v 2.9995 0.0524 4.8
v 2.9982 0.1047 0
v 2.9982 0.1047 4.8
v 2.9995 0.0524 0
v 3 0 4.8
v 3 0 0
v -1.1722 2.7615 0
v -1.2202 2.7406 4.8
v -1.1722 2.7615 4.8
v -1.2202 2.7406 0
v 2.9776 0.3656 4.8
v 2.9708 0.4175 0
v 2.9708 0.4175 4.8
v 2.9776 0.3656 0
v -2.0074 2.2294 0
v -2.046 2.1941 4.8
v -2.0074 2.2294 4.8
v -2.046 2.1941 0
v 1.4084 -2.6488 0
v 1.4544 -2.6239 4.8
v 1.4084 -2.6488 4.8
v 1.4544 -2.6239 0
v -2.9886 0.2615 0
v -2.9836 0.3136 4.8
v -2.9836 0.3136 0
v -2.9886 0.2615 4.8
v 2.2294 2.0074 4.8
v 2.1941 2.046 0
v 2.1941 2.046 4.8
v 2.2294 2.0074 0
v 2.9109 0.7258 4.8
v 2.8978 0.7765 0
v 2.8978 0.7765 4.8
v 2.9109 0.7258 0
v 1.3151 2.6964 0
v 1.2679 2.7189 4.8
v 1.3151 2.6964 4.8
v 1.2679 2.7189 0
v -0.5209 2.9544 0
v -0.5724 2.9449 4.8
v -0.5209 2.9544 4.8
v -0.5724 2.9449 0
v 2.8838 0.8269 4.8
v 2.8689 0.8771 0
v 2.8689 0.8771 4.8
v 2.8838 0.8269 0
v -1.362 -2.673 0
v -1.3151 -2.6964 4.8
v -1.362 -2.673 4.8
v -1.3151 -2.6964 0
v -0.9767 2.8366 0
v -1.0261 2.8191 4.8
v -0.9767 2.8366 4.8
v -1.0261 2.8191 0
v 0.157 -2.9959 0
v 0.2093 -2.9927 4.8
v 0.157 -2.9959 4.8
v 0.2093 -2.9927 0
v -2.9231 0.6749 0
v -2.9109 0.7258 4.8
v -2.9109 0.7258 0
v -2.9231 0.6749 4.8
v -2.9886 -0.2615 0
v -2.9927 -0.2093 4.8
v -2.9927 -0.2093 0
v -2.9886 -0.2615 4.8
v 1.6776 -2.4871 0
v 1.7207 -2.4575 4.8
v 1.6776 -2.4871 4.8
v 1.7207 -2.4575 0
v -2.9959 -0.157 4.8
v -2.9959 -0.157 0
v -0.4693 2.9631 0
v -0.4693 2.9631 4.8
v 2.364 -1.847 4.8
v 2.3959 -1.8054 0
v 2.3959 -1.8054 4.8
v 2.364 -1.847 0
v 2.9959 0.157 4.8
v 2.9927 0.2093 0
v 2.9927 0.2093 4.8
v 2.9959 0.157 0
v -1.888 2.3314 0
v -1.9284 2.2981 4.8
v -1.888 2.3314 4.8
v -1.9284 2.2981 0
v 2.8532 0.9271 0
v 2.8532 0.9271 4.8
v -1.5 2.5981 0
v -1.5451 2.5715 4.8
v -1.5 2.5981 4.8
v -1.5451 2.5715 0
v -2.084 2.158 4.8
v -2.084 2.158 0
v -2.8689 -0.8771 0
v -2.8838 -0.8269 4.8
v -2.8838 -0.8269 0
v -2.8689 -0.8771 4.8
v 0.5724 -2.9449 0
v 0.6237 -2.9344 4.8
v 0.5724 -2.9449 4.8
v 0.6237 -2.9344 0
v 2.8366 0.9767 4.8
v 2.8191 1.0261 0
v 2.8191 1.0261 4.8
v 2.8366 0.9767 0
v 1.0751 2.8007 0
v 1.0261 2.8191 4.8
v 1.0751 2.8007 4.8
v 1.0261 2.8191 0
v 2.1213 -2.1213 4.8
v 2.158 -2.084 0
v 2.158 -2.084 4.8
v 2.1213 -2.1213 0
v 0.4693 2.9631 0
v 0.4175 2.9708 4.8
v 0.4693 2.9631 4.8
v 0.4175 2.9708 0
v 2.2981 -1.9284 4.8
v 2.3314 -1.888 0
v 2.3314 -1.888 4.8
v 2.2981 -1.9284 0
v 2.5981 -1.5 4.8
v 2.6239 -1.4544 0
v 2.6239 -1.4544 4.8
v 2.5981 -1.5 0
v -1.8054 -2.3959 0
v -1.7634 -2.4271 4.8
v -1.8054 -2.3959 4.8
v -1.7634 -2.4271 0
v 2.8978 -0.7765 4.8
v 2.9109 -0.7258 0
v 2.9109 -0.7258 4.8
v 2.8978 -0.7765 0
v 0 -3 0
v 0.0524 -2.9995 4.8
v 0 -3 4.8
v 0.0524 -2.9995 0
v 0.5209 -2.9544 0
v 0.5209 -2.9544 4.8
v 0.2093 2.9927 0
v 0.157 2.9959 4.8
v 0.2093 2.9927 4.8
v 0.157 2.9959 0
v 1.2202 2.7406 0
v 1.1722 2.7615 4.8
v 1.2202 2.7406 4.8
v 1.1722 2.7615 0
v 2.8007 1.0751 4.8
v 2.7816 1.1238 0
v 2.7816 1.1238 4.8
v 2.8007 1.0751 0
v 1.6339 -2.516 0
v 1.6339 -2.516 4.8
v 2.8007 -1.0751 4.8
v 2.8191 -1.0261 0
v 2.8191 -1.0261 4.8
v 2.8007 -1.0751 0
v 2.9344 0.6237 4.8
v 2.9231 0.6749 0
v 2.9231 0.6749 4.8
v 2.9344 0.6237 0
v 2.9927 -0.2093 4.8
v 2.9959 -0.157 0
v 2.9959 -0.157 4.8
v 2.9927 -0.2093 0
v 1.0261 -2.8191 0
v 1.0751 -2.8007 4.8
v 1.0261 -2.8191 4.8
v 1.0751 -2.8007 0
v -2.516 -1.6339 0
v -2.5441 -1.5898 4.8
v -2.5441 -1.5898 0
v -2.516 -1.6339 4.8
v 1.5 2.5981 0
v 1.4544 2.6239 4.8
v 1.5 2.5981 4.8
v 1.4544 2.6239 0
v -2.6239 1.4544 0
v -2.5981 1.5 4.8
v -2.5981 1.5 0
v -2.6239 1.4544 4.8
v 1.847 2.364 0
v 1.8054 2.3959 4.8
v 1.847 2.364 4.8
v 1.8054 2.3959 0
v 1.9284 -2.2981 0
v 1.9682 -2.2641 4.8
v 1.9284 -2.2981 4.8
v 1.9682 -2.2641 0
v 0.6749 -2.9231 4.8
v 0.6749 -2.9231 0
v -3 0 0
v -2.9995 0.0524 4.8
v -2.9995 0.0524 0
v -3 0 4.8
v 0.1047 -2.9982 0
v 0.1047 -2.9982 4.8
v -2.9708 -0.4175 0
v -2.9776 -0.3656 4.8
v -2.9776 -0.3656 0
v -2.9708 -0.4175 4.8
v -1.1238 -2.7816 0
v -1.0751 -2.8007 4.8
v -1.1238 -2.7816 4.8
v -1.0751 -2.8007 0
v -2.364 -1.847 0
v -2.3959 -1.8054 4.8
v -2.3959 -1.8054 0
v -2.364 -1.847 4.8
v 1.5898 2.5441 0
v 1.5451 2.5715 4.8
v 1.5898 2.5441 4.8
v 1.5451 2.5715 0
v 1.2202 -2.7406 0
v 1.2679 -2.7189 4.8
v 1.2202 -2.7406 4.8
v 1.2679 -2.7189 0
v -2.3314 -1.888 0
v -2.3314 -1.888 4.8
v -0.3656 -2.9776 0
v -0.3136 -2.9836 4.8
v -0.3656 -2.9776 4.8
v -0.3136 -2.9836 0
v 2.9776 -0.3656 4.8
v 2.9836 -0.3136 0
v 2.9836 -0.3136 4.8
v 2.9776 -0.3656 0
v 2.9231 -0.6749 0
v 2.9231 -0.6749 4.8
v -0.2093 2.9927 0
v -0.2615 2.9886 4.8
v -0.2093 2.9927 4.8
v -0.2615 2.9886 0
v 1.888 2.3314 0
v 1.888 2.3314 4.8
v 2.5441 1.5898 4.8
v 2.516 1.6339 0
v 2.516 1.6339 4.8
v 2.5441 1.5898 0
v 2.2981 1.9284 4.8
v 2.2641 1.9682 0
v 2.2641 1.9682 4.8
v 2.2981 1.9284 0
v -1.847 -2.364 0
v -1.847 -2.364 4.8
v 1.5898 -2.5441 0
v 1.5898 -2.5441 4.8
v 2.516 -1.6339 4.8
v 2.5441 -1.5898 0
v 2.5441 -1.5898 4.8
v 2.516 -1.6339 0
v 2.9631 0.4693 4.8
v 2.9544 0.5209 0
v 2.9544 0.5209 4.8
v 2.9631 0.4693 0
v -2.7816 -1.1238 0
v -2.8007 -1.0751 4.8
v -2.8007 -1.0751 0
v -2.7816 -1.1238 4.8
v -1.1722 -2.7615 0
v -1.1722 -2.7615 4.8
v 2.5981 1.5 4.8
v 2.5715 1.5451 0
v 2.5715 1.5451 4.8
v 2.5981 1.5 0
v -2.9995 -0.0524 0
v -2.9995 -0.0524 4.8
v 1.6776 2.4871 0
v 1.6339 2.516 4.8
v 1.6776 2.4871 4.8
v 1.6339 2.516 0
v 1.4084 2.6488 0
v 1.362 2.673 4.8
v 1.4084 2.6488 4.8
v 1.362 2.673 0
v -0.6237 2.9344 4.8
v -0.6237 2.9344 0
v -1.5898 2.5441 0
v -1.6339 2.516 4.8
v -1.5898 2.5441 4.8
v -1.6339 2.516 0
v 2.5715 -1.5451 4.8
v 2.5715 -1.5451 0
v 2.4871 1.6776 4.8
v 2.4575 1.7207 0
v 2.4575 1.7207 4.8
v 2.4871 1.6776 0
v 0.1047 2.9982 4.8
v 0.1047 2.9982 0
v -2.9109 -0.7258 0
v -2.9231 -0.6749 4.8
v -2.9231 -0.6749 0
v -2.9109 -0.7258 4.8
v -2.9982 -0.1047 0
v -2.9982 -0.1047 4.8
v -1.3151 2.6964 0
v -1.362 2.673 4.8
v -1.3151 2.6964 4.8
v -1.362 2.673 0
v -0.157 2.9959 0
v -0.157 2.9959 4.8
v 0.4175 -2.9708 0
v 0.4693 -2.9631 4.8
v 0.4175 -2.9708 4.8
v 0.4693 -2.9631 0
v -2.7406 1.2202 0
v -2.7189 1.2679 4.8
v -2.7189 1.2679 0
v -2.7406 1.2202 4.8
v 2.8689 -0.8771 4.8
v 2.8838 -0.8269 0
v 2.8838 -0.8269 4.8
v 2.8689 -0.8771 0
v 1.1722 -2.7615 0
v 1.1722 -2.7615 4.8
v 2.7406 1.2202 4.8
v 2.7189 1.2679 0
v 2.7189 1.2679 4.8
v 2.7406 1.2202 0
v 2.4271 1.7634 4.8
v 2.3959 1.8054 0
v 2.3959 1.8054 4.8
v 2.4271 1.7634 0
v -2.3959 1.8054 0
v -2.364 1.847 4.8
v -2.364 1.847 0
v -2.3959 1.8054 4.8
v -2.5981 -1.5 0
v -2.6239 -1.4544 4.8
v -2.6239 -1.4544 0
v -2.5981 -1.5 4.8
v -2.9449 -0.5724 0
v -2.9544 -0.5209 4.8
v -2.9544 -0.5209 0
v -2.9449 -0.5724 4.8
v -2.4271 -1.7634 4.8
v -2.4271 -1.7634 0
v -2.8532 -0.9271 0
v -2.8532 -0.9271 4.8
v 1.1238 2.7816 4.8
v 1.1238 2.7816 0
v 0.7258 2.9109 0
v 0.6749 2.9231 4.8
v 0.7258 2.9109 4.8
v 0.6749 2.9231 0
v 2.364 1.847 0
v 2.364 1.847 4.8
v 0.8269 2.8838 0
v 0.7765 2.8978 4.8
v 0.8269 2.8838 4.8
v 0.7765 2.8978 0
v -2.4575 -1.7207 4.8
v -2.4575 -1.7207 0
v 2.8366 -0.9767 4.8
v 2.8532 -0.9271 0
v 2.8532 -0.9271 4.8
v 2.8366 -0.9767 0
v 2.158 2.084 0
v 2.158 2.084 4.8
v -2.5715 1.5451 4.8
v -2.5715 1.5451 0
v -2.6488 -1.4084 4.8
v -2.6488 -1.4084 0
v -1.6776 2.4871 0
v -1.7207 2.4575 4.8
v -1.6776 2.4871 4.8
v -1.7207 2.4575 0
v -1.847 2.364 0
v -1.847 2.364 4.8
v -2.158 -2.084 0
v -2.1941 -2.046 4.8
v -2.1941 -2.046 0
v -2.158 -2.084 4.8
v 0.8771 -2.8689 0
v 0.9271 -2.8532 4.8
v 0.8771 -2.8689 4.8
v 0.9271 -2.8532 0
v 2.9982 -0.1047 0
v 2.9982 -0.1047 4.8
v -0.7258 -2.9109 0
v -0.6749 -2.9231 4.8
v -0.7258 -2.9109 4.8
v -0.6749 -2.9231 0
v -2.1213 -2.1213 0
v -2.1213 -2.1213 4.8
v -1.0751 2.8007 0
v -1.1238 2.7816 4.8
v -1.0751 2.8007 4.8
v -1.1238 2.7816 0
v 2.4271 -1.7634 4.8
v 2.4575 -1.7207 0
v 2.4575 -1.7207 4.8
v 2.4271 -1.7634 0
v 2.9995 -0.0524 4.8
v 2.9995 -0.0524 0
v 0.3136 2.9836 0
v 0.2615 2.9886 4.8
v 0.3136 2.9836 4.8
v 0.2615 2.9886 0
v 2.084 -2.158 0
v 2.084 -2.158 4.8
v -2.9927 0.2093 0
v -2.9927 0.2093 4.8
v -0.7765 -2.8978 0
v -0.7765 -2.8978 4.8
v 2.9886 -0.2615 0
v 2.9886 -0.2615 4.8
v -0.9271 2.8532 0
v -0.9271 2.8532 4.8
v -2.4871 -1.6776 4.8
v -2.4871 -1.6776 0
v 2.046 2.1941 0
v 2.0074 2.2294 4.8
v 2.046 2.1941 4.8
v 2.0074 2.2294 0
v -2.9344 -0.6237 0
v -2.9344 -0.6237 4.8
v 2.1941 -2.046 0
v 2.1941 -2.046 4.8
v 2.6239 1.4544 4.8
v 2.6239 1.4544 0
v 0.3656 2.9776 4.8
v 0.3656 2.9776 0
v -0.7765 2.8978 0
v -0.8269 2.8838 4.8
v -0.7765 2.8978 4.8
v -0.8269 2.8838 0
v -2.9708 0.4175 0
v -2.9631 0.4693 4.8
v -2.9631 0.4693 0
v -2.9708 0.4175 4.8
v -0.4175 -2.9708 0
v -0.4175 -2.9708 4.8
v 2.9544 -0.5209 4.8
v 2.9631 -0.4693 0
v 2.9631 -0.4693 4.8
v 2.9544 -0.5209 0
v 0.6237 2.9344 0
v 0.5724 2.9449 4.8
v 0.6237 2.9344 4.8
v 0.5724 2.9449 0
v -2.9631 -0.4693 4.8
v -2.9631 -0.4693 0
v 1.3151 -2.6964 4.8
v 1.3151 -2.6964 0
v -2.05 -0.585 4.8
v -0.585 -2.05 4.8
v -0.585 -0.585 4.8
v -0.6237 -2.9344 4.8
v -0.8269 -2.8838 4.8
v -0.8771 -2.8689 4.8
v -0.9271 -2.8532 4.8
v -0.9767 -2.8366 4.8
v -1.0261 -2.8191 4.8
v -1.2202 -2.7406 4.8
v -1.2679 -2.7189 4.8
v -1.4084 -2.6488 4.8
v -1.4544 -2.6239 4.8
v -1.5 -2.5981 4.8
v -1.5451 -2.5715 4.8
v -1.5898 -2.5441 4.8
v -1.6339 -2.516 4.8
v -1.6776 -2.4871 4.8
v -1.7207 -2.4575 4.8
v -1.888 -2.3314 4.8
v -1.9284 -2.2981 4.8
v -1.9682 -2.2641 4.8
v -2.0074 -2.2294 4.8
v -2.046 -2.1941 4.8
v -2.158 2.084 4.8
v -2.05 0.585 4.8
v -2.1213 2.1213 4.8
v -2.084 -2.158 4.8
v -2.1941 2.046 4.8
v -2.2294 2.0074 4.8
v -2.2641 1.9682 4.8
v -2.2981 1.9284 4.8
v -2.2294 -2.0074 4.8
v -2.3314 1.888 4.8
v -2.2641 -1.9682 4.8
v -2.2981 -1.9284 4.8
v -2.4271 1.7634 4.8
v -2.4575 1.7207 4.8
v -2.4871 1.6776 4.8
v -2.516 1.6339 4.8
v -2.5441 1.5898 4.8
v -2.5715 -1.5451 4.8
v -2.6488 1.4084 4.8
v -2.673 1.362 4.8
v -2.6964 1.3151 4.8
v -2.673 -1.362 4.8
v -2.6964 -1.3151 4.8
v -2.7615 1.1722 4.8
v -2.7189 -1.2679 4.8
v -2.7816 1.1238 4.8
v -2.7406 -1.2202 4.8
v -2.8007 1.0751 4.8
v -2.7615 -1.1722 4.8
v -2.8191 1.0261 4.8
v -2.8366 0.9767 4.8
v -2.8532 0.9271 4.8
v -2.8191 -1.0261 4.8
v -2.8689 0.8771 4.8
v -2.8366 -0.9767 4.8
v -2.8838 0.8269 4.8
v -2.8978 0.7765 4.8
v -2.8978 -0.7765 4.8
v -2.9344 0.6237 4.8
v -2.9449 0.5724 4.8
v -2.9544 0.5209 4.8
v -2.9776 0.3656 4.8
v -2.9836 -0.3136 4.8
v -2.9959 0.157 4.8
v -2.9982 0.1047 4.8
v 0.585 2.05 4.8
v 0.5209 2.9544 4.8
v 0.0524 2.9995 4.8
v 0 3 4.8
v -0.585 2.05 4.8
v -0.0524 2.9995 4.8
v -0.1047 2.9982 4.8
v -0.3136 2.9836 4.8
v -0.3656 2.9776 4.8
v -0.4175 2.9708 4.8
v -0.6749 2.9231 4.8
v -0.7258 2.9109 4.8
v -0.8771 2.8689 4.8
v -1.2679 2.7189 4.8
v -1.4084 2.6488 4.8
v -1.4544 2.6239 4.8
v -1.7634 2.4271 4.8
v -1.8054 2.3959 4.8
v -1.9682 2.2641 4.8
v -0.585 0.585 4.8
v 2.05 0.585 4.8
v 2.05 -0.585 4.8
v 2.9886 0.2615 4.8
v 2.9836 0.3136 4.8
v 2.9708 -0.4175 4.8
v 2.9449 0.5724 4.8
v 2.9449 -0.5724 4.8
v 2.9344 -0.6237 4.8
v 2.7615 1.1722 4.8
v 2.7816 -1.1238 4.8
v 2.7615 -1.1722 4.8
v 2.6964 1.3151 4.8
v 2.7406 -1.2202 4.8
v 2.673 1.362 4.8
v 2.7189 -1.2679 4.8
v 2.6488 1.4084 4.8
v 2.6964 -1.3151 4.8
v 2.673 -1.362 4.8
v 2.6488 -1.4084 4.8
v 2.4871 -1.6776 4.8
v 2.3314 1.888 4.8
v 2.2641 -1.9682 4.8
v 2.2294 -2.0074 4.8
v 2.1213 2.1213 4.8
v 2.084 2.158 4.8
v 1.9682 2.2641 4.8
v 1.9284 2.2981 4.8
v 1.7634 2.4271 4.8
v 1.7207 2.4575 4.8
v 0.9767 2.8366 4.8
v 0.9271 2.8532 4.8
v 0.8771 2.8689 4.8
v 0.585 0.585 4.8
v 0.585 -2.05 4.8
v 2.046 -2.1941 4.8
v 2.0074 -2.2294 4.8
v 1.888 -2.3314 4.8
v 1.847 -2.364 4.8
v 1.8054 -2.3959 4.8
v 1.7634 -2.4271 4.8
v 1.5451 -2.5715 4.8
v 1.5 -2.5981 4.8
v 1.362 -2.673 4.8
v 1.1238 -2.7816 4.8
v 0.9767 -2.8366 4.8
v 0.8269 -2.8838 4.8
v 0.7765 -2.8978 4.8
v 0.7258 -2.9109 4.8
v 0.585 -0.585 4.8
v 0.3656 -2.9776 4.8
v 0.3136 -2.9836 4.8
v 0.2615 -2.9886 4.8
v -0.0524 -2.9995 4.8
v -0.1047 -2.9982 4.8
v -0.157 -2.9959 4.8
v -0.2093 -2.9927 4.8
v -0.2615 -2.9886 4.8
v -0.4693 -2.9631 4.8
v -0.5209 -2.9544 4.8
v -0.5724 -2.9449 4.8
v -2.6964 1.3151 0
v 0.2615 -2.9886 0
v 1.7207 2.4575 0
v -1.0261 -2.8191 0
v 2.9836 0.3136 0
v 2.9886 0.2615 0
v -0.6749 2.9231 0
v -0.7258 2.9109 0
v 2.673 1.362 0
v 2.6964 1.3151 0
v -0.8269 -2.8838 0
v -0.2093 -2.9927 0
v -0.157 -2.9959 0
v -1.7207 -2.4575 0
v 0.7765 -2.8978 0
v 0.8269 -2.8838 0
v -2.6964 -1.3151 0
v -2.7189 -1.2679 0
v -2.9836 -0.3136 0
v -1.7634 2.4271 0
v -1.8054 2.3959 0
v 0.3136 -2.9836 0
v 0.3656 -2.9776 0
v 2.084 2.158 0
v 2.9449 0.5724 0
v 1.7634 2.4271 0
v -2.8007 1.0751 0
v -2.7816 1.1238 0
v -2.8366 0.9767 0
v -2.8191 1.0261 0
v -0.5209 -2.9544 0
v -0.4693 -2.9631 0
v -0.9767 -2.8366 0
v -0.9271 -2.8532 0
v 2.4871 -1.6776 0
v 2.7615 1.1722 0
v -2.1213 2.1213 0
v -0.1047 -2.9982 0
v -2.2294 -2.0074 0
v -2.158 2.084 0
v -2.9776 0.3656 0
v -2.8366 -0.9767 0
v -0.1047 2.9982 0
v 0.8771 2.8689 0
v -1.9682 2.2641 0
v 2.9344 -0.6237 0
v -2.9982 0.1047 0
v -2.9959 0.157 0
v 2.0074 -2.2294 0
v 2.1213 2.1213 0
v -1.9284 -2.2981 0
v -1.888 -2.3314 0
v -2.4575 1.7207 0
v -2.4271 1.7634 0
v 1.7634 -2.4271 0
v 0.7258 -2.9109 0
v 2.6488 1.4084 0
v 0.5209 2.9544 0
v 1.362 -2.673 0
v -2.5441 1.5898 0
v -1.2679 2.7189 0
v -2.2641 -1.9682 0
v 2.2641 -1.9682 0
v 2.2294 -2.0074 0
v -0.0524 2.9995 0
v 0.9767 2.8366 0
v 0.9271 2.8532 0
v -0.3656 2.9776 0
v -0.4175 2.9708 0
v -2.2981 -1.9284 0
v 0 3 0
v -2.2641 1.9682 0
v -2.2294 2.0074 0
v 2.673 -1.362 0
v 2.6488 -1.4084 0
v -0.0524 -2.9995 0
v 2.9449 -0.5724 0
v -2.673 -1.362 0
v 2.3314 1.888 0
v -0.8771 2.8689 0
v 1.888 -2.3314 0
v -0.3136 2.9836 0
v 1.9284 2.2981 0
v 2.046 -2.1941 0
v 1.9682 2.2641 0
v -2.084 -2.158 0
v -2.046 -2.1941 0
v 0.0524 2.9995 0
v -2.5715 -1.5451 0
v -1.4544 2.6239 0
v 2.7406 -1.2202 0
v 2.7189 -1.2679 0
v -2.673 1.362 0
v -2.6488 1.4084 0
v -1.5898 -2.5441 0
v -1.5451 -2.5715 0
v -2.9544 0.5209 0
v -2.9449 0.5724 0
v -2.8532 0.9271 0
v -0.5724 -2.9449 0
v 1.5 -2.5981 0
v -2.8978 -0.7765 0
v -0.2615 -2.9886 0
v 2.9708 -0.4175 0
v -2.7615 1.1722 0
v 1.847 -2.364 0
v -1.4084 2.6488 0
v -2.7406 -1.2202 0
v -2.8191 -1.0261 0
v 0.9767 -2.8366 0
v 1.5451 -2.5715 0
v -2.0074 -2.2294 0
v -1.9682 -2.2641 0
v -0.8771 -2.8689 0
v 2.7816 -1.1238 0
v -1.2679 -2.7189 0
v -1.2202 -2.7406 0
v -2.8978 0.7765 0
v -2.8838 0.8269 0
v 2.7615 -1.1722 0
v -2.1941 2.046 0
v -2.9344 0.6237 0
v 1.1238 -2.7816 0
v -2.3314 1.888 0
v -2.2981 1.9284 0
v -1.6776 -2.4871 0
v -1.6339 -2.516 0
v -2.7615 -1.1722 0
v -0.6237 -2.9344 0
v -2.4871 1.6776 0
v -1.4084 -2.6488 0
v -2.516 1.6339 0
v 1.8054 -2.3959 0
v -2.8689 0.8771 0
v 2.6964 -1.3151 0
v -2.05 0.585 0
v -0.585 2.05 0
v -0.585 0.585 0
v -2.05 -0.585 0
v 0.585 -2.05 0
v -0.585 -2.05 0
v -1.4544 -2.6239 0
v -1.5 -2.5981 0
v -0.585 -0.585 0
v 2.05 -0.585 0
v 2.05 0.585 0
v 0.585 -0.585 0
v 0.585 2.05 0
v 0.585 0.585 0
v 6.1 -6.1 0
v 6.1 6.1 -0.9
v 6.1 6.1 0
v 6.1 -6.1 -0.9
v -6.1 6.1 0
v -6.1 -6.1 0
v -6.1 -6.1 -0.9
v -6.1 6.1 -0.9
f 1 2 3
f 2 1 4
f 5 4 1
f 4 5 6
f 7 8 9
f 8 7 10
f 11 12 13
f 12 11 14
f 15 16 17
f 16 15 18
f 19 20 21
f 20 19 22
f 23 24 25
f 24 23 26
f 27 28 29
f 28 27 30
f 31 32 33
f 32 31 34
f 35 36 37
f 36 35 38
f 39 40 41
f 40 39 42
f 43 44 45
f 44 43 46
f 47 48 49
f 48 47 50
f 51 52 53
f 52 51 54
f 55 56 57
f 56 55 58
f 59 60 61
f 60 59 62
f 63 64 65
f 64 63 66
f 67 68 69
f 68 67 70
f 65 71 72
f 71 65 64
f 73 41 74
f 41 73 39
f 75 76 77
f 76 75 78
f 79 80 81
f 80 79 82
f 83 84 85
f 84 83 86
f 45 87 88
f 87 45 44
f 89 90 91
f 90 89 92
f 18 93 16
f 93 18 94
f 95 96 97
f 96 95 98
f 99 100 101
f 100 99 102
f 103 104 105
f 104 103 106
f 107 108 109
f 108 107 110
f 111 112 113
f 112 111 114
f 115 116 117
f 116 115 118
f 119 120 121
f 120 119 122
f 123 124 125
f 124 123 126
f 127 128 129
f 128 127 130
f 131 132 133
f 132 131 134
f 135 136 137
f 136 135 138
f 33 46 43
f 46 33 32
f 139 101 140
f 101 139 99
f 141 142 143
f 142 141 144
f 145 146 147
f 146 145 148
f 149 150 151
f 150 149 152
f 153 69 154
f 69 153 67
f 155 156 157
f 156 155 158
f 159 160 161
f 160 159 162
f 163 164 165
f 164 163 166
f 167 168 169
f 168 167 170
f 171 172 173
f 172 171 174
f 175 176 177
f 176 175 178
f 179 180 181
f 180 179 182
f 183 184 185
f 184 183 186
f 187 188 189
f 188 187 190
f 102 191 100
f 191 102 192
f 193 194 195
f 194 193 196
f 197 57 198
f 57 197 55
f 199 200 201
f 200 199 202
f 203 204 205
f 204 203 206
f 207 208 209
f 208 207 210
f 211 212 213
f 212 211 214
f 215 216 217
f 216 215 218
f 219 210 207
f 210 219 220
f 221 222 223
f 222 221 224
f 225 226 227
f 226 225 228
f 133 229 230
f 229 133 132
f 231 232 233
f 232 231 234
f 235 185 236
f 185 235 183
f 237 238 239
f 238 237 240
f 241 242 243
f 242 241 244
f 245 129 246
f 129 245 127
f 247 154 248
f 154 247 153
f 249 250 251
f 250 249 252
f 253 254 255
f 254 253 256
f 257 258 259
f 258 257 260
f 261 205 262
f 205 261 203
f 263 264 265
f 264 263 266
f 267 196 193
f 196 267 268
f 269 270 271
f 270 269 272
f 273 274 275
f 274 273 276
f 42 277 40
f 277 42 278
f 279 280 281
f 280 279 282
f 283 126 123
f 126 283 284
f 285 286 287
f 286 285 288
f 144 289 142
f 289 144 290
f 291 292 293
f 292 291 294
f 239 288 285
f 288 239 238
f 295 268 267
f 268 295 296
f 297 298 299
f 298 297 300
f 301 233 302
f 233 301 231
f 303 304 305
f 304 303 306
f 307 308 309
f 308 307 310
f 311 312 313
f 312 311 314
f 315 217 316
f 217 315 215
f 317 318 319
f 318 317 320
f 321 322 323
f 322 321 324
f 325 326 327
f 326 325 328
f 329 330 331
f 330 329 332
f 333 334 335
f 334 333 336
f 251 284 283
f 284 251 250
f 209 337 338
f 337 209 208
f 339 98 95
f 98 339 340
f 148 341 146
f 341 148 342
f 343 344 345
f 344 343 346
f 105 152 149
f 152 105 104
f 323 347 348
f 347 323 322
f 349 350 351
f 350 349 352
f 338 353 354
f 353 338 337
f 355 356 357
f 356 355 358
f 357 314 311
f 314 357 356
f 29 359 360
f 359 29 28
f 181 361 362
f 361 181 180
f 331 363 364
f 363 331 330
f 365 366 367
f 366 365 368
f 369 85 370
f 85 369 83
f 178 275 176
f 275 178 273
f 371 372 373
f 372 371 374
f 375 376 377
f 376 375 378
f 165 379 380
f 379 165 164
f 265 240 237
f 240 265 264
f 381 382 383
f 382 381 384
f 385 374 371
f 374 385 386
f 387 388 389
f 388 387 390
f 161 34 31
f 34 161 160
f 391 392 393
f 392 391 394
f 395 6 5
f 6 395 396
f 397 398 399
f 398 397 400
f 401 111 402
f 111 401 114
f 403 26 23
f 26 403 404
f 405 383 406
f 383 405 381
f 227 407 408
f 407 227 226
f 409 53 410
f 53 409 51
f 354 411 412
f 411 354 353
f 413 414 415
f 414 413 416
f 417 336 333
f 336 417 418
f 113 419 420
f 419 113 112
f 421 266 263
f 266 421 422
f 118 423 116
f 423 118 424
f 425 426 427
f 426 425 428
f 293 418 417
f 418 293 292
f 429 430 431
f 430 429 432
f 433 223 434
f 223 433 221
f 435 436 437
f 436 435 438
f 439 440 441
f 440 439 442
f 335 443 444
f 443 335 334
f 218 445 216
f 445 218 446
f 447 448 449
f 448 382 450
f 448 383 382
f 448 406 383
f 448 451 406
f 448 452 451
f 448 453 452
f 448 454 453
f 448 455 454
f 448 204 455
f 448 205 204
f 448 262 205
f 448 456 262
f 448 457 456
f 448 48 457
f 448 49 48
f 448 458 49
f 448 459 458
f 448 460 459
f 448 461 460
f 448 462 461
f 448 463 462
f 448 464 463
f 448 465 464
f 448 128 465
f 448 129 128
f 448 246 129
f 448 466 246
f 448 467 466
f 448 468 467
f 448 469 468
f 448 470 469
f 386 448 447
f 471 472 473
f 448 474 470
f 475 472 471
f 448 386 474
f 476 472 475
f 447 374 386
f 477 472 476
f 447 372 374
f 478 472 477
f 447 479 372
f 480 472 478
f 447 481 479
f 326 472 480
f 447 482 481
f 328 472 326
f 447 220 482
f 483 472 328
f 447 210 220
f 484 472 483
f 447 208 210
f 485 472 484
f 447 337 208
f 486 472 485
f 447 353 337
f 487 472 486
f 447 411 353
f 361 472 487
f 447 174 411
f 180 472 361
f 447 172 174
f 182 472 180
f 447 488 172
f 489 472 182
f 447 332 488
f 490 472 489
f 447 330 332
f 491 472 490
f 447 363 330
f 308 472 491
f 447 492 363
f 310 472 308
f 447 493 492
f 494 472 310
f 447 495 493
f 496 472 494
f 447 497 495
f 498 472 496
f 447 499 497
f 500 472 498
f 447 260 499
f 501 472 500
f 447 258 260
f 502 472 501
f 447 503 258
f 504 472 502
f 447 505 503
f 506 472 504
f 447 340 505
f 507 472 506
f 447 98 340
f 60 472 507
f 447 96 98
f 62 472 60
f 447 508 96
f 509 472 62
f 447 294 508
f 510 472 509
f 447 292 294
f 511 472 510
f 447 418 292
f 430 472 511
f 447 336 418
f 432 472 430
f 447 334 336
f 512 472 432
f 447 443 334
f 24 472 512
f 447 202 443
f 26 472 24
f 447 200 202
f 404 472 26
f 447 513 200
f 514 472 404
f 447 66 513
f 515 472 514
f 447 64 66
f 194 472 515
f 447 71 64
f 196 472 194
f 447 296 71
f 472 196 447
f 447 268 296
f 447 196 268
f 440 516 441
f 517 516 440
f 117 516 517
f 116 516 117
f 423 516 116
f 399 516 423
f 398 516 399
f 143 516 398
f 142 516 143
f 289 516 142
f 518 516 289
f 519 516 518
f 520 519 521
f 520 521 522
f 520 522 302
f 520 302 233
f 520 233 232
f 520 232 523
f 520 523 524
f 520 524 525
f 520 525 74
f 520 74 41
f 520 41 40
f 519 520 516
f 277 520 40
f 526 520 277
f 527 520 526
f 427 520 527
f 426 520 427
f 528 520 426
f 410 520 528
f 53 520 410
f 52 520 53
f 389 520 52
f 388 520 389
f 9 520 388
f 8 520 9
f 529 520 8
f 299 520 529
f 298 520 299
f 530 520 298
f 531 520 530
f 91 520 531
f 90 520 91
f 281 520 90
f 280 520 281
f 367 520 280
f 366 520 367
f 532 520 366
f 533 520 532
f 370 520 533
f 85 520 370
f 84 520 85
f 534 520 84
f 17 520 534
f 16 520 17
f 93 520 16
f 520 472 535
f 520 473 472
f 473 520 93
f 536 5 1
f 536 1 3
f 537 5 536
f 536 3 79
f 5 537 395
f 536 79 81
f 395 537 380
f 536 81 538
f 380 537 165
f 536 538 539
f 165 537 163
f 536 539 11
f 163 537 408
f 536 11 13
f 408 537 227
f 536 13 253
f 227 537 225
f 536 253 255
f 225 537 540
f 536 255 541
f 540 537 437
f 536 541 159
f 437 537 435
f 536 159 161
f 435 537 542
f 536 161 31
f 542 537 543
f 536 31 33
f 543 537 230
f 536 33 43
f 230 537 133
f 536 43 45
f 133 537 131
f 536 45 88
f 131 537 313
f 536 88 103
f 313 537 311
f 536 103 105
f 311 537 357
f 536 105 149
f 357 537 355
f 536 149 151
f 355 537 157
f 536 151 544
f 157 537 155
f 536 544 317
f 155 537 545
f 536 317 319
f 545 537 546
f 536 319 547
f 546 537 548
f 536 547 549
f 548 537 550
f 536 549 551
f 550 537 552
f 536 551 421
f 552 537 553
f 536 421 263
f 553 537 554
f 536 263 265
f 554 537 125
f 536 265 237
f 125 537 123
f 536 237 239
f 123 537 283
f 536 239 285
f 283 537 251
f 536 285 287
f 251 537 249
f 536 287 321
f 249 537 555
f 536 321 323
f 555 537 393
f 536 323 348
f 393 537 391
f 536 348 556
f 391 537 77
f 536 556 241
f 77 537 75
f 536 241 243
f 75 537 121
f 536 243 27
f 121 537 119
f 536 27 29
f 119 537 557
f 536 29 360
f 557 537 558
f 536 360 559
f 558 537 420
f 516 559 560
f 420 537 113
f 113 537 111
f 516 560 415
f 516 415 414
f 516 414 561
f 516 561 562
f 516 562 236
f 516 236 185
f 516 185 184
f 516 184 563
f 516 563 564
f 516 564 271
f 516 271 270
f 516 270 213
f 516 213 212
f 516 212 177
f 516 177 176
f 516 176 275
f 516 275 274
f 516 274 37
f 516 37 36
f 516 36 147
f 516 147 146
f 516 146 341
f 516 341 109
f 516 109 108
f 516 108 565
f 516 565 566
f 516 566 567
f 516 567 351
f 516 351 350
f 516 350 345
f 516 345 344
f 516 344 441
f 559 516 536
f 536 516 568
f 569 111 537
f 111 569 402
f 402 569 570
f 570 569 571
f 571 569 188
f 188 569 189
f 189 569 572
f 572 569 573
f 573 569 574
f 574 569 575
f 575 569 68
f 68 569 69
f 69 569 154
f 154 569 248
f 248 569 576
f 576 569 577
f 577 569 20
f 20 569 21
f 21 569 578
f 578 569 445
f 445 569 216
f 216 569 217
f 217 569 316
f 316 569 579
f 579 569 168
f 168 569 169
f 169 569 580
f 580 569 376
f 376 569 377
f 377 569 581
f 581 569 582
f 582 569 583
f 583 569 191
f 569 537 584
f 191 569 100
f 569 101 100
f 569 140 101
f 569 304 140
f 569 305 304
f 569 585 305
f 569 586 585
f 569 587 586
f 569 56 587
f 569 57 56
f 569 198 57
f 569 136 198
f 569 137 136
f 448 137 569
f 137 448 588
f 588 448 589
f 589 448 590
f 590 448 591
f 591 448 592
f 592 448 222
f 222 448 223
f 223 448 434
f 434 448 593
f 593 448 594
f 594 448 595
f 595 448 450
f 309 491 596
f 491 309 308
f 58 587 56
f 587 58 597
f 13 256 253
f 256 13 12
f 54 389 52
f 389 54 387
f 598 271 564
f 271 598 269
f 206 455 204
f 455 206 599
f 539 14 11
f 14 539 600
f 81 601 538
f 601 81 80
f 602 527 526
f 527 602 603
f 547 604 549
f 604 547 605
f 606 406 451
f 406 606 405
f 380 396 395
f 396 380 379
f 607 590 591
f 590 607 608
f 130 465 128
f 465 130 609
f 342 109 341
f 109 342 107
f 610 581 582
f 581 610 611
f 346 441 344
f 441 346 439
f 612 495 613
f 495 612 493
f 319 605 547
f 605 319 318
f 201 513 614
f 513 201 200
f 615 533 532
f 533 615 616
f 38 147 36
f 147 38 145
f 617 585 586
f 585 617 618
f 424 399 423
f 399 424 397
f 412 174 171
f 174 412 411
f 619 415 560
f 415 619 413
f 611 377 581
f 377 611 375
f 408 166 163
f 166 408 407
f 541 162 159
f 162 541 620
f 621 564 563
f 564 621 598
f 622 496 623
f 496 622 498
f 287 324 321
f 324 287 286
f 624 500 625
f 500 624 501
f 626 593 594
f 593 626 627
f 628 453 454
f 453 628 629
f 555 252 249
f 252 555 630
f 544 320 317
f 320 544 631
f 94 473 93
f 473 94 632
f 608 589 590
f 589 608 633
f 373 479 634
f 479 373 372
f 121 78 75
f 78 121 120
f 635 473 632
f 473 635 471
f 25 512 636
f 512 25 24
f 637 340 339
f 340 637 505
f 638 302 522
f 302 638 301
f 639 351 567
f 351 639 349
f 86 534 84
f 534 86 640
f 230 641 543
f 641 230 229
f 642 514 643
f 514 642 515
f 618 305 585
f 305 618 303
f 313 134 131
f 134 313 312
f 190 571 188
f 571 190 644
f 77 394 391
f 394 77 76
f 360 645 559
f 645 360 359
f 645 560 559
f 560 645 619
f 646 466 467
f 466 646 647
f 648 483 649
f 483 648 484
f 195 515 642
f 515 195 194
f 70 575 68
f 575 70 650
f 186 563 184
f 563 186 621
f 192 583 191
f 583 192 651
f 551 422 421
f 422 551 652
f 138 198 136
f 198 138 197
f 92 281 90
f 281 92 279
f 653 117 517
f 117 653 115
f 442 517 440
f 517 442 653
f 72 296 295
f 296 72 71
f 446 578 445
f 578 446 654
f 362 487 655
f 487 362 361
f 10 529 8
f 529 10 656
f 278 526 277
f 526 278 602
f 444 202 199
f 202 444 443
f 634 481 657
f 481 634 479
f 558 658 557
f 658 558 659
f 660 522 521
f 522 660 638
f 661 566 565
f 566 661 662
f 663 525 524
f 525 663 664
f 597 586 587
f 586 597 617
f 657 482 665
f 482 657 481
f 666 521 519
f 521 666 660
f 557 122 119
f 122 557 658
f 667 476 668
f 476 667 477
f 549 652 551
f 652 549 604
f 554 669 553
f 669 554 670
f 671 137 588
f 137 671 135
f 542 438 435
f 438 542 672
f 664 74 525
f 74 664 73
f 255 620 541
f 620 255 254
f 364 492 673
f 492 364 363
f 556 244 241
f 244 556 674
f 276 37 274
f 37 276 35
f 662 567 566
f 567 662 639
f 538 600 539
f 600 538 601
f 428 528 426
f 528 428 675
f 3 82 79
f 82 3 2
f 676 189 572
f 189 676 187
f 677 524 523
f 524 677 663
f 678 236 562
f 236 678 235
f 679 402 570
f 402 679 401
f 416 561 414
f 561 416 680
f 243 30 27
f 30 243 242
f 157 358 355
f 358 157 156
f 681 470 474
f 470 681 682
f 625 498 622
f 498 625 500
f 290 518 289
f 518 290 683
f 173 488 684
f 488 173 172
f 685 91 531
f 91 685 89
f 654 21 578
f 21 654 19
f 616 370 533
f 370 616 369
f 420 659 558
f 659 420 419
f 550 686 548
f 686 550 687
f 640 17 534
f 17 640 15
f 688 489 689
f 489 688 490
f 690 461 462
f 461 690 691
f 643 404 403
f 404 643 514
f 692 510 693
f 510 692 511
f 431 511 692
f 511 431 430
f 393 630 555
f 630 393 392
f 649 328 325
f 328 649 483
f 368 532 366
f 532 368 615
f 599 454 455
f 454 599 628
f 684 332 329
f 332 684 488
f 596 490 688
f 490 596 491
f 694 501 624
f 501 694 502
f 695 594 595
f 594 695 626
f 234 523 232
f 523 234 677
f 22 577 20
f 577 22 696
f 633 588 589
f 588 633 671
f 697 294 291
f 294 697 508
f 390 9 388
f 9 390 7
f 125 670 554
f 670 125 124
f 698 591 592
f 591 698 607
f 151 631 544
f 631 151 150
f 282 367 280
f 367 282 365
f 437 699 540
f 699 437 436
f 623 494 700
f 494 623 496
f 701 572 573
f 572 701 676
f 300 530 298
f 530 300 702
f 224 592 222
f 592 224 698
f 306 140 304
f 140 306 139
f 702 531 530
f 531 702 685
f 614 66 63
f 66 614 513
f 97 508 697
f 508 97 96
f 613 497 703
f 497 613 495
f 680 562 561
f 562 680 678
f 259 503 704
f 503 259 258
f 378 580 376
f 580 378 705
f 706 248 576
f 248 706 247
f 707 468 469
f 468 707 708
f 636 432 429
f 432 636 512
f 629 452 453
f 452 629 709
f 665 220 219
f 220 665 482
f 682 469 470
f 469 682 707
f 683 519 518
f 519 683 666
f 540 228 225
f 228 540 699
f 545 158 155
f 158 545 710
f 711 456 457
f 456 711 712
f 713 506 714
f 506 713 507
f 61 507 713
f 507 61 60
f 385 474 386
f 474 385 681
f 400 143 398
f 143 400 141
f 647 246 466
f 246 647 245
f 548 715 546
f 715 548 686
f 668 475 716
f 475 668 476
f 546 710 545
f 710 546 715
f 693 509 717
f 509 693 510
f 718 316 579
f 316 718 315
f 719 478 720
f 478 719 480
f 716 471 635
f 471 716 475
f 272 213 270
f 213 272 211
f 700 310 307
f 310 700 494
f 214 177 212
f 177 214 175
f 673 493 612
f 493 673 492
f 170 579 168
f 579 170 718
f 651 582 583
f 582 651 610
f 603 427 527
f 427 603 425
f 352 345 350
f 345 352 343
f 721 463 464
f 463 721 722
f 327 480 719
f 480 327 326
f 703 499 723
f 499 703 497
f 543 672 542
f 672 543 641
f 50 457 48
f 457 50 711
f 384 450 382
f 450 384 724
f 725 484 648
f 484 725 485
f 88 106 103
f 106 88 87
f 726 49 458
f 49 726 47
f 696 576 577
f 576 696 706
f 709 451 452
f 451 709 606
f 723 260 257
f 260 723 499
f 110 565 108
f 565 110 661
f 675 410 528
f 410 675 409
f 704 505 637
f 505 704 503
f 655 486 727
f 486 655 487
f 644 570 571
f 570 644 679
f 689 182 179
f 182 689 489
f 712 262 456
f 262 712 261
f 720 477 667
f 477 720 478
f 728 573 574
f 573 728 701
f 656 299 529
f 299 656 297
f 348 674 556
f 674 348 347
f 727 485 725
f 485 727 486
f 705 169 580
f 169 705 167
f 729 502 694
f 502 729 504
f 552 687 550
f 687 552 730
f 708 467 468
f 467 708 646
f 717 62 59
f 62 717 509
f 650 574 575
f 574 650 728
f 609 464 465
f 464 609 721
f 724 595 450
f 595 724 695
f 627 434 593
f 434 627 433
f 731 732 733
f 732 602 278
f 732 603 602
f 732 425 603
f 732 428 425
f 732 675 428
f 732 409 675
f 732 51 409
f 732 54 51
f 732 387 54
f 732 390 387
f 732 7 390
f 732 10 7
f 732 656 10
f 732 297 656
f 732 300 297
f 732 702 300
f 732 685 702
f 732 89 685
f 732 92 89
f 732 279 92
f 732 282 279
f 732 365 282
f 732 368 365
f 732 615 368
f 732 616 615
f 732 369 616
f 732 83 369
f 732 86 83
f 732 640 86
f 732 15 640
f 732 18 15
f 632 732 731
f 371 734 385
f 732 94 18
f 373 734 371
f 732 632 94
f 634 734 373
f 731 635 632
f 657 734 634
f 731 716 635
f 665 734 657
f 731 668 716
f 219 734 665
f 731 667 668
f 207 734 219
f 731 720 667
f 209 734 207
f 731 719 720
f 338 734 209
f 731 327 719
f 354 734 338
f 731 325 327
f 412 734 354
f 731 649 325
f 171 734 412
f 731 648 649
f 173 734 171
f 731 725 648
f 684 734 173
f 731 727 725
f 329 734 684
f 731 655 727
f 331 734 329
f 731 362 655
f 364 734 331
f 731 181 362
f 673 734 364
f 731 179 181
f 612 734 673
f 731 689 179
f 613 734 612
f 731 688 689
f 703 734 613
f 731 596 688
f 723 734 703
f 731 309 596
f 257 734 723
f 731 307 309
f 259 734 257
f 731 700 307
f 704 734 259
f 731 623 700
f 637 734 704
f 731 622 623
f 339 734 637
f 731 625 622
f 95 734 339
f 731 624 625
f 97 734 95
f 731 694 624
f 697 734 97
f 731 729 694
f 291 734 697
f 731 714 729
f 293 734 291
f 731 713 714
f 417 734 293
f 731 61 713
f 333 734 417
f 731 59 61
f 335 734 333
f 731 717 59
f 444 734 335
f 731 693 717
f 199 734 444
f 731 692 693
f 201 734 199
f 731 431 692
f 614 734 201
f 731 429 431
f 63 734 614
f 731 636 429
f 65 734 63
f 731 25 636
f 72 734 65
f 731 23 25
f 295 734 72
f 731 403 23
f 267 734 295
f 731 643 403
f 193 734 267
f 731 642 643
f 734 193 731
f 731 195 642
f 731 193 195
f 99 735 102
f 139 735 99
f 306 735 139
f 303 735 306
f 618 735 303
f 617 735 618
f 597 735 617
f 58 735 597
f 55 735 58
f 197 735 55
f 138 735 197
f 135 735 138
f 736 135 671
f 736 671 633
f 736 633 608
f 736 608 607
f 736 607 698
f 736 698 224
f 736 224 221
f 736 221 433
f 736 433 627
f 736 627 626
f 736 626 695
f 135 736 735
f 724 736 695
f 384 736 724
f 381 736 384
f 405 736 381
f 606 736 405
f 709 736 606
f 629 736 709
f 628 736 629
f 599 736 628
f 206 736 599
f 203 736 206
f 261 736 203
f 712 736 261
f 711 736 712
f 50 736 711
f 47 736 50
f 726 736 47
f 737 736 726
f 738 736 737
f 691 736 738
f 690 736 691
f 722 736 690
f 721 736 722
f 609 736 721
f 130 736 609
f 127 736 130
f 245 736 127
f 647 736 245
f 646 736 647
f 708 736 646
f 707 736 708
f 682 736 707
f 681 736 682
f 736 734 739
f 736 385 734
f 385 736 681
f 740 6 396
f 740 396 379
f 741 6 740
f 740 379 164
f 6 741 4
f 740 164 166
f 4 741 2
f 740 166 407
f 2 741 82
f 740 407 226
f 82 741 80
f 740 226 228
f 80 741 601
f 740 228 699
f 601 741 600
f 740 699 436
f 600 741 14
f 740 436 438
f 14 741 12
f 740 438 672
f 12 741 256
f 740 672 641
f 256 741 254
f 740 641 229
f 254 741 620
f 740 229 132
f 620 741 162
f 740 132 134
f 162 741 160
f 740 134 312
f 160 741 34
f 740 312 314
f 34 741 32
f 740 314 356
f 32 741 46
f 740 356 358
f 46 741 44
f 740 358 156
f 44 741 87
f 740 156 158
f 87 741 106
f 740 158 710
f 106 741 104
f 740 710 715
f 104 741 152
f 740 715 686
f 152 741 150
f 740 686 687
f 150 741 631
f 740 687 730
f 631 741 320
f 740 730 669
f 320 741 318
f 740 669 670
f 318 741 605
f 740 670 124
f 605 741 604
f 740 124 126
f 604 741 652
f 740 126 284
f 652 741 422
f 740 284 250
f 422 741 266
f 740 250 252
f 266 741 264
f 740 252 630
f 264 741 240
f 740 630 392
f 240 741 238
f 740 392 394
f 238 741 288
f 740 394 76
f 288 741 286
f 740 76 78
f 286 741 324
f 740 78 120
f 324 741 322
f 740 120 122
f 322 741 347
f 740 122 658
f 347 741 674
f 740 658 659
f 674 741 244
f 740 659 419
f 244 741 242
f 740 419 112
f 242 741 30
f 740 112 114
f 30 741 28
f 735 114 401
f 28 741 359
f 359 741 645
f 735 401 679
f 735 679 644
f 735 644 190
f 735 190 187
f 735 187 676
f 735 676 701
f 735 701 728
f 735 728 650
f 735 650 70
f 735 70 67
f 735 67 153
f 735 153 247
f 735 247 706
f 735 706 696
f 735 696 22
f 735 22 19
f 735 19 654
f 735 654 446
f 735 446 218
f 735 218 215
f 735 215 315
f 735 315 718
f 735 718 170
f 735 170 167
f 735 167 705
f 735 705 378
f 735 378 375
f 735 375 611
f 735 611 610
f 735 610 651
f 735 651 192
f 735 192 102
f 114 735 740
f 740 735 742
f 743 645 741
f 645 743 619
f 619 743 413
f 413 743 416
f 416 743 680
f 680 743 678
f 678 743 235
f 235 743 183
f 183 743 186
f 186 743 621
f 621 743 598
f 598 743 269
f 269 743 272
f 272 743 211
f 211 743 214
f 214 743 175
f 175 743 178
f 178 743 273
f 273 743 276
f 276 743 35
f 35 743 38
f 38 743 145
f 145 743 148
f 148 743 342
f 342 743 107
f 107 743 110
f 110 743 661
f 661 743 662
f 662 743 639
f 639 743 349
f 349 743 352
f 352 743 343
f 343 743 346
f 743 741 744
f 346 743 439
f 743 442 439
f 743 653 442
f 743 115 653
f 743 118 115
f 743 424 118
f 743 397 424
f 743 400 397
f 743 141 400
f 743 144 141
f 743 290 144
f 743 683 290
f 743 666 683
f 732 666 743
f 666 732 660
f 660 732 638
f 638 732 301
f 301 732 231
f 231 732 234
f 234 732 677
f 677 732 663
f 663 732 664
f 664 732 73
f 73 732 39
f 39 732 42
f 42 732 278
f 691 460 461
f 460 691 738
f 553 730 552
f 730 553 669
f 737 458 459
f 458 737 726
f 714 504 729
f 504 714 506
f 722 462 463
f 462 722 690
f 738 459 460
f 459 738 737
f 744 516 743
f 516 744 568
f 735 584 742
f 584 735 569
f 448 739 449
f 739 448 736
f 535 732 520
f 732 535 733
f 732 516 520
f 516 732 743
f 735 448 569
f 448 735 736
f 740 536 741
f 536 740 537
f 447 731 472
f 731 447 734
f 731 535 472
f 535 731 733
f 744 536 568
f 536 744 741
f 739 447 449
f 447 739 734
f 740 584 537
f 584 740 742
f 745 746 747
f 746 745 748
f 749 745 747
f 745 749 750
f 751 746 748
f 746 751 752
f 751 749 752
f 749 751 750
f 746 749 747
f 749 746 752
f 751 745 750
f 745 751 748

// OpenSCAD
/**
* based on http://deskthority.net/w/images/c/c8/Cherry_MX_1%C3%971_keycap_specification_%281983%29.pdf
* TODO: find better source, and/or measure several brands.
*
* v.1
* 2014-May-26
*/

baseplate();
mx_mount();

/** a simple plane where to develop the keycap on top of
* NOTE: the depth of 0.95mm... it shouldn't matter because you should build
* your keycap on top of it. If not expanding the geometry with more plastic
* there, but instead using as a base for a wooden keycap cup or some
* other crazy idea, use the minimum your material/printer
* will be comfortable with
*/
module baseplate(){
	translate( [0,0, -0.9/2] )
		cube( size=[12.2,12.2,0.9], center=true );
}

/**
* The female part of the steam.
* NOTE: i'm not 100% sure on the height, as the drawing I found does not have
* it measured... and i can't infer it with full confidence when
* just accounting for the other measurements. the drawing os probably more
* concerned with the keycap per se.
*/
module mx_mount(){
	//mx_height = 4.7; // measured from an actual CM storm cap
	mx_height = 4.8;
	translate( [0,0,mx_height/2] ){
		difference(){
			cylinder( h=mx_height, r=6/2, center=true, $fn=360 );
				cube( size=[1.17,4.1,mx_height+2], center=true );
				cube( size=[4.1,1.17,mx_height+2], center=true );
		}
	}
}

module mx_mount_solid(){
	//mx_height = 4.7; // measured from an actual CM storm cap
	mx_height = 4.8;
	translate( [0,0,mx_height/2] ){
		//difference(){
			cylinder( h=mx_height, r=6/2, center=true, $fn=360 );
		//}
	}
}
